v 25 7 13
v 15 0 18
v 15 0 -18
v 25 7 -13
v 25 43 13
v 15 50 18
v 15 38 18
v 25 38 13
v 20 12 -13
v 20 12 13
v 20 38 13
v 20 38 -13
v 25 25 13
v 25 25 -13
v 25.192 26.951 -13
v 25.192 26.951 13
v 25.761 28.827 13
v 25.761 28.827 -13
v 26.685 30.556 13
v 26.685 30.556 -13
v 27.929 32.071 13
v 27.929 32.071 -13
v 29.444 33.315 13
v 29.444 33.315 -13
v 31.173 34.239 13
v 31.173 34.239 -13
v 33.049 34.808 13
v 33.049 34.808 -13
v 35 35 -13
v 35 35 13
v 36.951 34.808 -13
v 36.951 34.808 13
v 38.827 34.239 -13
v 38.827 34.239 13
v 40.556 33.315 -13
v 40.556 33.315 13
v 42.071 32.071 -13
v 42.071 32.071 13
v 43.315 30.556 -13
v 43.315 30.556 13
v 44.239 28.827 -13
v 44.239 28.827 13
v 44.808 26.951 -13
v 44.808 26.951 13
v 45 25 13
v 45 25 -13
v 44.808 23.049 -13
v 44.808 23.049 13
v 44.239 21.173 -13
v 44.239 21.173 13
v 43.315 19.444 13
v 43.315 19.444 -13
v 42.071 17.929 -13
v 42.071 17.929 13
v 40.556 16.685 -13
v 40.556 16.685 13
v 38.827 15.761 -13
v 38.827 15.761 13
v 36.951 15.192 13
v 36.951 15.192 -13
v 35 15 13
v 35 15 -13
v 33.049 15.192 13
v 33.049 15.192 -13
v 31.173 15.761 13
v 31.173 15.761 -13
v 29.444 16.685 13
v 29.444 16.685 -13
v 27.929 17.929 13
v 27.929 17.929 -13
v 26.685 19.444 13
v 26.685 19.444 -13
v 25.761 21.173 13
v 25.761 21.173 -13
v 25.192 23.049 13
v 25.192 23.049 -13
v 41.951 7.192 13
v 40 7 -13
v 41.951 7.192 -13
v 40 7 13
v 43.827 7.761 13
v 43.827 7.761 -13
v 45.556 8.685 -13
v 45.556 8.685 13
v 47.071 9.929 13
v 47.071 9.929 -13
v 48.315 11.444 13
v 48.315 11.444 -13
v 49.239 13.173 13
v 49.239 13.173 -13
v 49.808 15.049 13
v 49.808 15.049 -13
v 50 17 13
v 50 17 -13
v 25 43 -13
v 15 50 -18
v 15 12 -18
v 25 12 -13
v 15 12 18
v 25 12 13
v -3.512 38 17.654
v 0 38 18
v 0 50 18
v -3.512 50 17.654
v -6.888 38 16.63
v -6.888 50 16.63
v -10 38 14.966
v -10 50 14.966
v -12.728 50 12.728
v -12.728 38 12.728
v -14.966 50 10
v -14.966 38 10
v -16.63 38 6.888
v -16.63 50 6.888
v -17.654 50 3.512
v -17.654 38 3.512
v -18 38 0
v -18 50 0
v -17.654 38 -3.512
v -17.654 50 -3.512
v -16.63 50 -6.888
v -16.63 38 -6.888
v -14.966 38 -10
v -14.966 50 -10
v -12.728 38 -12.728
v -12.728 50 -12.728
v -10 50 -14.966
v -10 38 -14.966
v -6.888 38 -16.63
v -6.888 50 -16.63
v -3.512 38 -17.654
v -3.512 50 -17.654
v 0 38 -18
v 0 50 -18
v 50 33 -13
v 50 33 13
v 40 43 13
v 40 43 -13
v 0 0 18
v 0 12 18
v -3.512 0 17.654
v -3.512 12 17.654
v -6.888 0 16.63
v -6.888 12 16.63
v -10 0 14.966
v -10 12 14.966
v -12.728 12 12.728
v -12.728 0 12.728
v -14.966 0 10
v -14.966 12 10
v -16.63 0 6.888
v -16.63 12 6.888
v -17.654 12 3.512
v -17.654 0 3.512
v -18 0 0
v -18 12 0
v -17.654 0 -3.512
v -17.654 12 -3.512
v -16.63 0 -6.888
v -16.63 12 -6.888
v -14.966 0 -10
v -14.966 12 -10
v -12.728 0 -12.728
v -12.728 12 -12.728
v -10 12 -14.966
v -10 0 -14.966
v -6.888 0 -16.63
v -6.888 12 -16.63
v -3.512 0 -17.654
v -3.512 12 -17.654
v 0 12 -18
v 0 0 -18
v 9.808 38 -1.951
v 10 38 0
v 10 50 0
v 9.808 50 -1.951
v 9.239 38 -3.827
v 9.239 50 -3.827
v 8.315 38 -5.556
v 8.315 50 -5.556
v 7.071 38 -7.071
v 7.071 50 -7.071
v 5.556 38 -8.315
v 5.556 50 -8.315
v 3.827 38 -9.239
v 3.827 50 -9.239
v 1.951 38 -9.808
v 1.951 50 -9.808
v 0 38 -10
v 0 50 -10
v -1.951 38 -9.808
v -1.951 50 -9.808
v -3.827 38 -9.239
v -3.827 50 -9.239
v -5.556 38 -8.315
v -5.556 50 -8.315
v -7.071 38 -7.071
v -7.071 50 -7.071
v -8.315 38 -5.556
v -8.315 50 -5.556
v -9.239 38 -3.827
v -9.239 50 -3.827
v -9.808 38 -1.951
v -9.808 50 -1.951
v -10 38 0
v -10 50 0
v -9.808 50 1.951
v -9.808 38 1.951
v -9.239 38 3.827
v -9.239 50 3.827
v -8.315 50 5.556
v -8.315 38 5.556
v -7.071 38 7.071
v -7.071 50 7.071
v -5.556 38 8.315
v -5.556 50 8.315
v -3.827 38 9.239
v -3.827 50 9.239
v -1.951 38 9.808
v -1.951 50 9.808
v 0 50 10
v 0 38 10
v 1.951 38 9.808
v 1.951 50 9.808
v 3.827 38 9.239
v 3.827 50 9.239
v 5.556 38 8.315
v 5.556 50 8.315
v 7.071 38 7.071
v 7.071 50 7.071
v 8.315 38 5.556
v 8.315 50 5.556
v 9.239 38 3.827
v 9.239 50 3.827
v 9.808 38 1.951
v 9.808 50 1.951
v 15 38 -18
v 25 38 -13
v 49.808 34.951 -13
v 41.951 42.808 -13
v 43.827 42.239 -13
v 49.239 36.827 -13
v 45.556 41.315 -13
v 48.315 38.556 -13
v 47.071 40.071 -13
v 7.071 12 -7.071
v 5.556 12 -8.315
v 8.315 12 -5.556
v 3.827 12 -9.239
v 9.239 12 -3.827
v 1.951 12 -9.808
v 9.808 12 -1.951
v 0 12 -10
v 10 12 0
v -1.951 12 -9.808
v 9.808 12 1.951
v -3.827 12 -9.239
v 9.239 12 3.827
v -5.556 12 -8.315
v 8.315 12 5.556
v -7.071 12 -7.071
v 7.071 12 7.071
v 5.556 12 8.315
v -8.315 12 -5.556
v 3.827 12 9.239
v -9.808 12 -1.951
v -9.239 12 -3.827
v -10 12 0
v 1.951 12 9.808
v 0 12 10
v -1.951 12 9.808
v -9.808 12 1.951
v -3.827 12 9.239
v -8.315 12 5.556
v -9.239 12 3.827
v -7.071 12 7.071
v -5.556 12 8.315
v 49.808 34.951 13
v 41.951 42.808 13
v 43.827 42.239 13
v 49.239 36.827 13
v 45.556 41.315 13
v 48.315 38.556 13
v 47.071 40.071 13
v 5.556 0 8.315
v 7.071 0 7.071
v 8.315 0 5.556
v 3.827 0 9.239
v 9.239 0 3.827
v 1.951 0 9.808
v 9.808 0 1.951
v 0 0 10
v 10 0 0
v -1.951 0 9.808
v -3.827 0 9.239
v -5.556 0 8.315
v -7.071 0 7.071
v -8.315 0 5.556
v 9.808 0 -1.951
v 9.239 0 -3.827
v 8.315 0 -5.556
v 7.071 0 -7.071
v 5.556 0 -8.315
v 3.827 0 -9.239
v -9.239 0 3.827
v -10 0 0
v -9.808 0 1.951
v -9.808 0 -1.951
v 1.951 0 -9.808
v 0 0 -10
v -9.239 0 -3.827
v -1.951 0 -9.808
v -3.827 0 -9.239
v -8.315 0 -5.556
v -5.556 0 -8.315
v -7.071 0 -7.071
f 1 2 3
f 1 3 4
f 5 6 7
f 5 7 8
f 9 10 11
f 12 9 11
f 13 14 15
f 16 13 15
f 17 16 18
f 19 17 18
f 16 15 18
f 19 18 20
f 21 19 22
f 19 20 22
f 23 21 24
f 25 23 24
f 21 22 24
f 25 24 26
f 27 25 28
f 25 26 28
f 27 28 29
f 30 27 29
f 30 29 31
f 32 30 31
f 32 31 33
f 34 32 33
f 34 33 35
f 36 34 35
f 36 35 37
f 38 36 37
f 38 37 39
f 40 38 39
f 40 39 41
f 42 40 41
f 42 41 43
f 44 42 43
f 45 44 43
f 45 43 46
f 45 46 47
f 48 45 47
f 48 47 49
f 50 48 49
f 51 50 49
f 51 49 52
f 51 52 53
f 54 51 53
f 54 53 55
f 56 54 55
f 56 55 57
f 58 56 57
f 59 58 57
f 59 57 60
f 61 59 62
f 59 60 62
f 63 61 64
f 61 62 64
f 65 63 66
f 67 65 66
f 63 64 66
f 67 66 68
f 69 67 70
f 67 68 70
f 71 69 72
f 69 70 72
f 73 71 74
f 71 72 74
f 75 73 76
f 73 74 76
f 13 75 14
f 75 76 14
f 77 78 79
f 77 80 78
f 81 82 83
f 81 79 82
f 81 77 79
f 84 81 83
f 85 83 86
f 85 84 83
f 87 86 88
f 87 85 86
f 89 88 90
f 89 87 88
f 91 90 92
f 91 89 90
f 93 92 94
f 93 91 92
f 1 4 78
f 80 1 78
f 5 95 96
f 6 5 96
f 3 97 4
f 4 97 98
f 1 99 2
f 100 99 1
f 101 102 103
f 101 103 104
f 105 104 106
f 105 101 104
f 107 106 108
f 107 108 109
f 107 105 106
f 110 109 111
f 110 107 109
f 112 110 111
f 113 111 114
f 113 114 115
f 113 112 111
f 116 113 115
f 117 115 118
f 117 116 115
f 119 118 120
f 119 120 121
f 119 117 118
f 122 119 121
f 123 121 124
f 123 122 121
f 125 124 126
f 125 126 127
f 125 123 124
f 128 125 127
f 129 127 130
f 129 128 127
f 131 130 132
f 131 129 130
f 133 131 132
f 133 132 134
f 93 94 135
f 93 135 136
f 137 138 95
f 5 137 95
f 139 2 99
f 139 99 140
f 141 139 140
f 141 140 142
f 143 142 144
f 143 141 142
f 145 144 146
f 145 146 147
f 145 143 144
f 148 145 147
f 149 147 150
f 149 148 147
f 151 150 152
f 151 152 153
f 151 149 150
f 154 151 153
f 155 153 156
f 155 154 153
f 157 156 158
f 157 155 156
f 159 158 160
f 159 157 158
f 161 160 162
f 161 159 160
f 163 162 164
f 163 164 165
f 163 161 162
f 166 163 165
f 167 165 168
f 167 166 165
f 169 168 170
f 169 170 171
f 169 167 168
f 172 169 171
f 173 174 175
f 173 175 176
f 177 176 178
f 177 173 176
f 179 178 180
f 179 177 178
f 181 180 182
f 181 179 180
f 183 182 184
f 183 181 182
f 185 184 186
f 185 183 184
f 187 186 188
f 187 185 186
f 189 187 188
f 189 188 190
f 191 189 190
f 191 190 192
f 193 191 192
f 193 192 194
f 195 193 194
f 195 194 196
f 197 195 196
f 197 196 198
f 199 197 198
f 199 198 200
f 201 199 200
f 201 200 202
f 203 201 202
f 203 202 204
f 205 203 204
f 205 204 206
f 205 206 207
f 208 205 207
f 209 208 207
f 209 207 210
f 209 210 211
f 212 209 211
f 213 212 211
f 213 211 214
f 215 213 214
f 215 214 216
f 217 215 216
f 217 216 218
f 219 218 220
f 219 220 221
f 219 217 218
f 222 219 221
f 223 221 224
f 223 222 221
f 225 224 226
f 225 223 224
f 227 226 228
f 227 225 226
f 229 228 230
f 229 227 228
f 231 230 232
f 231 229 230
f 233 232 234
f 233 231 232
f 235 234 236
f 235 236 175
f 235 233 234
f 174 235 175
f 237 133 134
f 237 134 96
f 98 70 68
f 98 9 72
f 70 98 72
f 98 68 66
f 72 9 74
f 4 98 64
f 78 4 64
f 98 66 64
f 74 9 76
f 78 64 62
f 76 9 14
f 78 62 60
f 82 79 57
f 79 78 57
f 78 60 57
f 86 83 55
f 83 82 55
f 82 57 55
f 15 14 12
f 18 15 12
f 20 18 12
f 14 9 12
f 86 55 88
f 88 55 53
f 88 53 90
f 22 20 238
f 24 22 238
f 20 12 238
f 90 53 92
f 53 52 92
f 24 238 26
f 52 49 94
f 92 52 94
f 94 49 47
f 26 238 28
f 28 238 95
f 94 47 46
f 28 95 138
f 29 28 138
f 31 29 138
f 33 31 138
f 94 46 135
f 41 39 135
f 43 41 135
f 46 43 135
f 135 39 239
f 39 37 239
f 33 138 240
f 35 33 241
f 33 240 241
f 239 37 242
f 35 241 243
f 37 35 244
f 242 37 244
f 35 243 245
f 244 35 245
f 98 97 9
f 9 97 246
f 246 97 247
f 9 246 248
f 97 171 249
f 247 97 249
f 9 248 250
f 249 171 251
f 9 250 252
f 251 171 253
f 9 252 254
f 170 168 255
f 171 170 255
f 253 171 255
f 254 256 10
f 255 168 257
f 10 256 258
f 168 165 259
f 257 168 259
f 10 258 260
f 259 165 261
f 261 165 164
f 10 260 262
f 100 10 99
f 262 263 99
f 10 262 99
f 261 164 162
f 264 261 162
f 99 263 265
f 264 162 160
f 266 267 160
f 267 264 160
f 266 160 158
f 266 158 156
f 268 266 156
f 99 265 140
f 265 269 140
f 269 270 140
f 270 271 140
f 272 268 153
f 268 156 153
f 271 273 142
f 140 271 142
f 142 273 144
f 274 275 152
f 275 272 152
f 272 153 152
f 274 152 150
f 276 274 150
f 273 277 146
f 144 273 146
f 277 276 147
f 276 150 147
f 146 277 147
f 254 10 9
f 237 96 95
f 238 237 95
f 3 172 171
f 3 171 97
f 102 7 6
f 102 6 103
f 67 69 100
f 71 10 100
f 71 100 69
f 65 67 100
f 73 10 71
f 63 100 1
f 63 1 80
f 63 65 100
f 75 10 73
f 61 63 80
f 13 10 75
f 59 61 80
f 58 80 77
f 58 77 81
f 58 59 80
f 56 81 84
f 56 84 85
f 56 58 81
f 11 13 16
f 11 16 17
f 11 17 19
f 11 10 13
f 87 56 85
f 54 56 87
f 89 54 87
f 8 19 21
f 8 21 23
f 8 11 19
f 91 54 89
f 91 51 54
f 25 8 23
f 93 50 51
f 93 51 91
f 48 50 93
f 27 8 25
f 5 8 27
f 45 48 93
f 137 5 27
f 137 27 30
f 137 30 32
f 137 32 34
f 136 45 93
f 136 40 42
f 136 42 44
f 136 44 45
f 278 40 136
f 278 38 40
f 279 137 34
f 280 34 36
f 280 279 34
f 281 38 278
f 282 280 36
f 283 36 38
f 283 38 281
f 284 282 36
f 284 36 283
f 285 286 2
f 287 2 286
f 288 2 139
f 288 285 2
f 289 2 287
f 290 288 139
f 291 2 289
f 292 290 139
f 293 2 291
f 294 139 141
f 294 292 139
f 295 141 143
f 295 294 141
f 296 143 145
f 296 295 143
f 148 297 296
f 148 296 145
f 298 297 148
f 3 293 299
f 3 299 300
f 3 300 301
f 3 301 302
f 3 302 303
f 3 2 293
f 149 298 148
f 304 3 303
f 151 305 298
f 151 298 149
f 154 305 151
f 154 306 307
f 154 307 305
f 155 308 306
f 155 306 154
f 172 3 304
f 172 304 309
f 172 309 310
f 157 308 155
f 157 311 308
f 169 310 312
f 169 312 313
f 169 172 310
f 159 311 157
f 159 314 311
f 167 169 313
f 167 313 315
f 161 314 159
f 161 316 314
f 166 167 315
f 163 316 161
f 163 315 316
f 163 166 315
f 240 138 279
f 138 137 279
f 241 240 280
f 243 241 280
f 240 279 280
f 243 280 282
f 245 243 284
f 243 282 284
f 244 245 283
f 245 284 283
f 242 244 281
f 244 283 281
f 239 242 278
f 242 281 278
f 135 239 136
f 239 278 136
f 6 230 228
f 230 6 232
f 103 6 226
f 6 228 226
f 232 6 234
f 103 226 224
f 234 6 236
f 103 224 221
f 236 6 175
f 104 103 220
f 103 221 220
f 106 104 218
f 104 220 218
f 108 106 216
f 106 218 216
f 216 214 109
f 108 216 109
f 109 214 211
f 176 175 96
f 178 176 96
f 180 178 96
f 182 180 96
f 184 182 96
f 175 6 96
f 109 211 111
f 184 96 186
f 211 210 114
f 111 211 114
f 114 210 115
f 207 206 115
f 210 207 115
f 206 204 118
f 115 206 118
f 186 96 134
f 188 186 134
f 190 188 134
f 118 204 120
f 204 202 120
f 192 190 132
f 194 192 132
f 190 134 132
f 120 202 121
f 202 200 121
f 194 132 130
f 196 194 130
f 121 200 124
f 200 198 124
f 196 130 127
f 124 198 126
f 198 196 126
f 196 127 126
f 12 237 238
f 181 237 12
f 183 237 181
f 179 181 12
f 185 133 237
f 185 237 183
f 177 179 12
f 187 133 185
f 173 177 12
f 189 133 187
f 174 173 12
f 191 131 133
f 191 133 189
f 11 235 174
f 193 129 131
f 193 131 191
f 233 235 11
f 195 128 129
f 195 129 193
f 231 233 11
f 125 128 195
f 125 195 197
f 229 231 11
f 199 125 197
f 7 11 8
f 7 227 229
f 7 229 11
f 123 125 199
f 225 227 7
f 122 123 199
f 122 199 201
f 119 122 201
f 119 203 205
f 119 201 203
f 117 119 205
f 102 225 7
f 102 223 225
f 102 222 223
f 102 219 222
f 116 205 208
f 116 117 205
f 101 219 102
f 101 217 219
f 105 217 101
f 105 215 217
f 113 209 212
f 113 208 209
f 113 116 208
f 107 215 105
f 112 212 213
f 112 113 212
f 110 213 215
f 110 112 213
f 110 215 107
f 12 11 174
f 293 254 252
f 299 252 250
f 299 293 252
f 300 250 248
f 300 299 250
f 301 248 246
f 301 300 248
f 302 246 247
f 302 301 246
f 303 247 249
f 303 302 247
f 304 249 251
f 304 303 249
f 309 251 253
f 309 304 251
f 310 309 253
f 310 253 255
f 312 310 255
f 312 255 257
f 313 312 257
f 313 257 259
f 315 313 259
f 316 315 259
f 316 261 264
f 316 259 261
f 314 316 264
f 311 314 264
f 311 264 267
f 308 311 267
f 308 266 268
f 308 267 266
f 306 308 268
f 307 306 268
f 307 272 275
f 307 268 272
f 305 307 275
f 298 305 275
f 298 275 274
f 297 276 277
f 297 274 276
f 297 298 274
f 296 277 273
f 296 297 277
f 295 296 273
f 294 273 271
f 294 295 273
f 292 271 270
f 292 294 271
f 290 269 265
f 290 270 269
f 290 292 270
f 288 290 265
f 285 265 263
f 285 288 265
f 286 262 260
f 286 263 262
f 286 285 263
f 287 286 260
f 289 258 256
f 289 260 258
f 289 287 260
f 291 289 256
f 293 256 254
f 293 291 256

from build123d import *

# Parameters (mm, degrees)
SKETCH1_R           = 10
BOSS_EXTRUDE1_DEPTH = 50
SKETCH2_W           = 44.116747391
SKETCH2_H           = 26
CUT_EXTRUDE1_DEPTH  = 50
SKETCH3_R           = 10
CUT_EXTRUDE2_DEPTH  = 50
CUT_EXTRUDE3_DEPTH  = 36
CUT_EXTRUDE4_DEPTH  = 50
FILLET1_R           = 10
SKETCH6_W           = 2.5
SKETCH6_H           = 26
CUT_EXTRUDE5_DEPTH  = 50


with BuildPart() as part:
    # Sketch1 → Boss-Extrude1 (new body)
    with BuildSketch(Plane(origin=(0, 0, 0), x_dir=(1, 0, 0), z_dir=(0, 1, 0))):
        with BuildLine():
            Line((0, 18), (50, 18))
            Line((50, 18), (50, -18))
            Line((50, -18), (0, -18))
            ThreePointArc((0, -18), (-18, 0), (0, 18))
        make_face()
        Circle(SKETCH1_R, mode=Mode.SUBTRACT)
    extrude(amount=BOSS_EXTRUDE1_DEPTH)

    # Sketch2 → Cut-Extrude1 (cut)
    with BuildSketch(Plane(origin=(0, 0, -18), x_dir=(-1, 0, 0), z_dir=(0, 0, -1))):
        with Locations((2.058373696, 25)):
            Rectangle(SKETCH2_W, SKETCH2_H)
    extrude(amount=-CUT_EXTRUDE1_DEPTH, mode=Mode.SUBTRACT)

    # Sketch3 → Cut-Extrude2 (cut)
    with BuildSketch(Plane(origin=(0, 0, -18), x_dir=(-1, 0, 0), z_dir=(0, 0, -1))):
        with Locations((-35, 25)):
            Circle(SKETCH3_R)
    extrude(amount=-CUT_EXTRUDE2_DEPTH, mode=Mode.SUBTRACT)

    # Sketch4 → Cut-Extrude3 (cut)
    with BuildSketch(Plane(origin=(0, 0, -18), x_dir=(-1, 0, 0), z_dir=(0, 0, -1))):
        Polygon((-15, 0), (-25, 7), (-50, 7), (-50, 0), align=None)
        Polygon((-50, 50), (-50, 43), (-25, 43), (-15, 50), align=None)
    extrude(amount=-CUT_EXTRUDE3_DEPTH, mode=Mode.SUBTRACT)

    # Sketch5 → Cut-Extrude4 (cut)
    with BuildSketch(Plane(origin=(0, 50, 0), x_dir=(1, 0, 0), z_dir=(0, 1, 0))):
        Polygon((15, 18), (25, 13), (50, 13), (50, 18), align=None)
        Polygon((15, -18), (25, -13), (50, -13), (50, -18), align=None)
    extrude(amount=-CUT_EXTRUDE4_DEPTH, mode=Mode.SUBTRACT)

    # Fillet1
    fillet1_edges = [part.edges().sort_by_distance(p)[0] for p in [
        (50, 7, 0),
        (50, 43, 0),
    ]]
    fillet(fillet1_edges, radius=FILLET1_R)

    # Sketch6 → Cut-Extrude5 (cut)
    with BuildSketch(Plane.ZY.offset(-20)):
        with Locations((-14.25, 25)):
            Rectangle(SKETCH6_W, SKETCH6_H)
        with Locations((14.25, 25)):
            Rectangle(SKETCH6_W, SKETCH6_H)
    extrude(amount=-CUT_EXTRUDE5_DEPTH, mode=Mode.SUBTRACT)


solid = part.part
